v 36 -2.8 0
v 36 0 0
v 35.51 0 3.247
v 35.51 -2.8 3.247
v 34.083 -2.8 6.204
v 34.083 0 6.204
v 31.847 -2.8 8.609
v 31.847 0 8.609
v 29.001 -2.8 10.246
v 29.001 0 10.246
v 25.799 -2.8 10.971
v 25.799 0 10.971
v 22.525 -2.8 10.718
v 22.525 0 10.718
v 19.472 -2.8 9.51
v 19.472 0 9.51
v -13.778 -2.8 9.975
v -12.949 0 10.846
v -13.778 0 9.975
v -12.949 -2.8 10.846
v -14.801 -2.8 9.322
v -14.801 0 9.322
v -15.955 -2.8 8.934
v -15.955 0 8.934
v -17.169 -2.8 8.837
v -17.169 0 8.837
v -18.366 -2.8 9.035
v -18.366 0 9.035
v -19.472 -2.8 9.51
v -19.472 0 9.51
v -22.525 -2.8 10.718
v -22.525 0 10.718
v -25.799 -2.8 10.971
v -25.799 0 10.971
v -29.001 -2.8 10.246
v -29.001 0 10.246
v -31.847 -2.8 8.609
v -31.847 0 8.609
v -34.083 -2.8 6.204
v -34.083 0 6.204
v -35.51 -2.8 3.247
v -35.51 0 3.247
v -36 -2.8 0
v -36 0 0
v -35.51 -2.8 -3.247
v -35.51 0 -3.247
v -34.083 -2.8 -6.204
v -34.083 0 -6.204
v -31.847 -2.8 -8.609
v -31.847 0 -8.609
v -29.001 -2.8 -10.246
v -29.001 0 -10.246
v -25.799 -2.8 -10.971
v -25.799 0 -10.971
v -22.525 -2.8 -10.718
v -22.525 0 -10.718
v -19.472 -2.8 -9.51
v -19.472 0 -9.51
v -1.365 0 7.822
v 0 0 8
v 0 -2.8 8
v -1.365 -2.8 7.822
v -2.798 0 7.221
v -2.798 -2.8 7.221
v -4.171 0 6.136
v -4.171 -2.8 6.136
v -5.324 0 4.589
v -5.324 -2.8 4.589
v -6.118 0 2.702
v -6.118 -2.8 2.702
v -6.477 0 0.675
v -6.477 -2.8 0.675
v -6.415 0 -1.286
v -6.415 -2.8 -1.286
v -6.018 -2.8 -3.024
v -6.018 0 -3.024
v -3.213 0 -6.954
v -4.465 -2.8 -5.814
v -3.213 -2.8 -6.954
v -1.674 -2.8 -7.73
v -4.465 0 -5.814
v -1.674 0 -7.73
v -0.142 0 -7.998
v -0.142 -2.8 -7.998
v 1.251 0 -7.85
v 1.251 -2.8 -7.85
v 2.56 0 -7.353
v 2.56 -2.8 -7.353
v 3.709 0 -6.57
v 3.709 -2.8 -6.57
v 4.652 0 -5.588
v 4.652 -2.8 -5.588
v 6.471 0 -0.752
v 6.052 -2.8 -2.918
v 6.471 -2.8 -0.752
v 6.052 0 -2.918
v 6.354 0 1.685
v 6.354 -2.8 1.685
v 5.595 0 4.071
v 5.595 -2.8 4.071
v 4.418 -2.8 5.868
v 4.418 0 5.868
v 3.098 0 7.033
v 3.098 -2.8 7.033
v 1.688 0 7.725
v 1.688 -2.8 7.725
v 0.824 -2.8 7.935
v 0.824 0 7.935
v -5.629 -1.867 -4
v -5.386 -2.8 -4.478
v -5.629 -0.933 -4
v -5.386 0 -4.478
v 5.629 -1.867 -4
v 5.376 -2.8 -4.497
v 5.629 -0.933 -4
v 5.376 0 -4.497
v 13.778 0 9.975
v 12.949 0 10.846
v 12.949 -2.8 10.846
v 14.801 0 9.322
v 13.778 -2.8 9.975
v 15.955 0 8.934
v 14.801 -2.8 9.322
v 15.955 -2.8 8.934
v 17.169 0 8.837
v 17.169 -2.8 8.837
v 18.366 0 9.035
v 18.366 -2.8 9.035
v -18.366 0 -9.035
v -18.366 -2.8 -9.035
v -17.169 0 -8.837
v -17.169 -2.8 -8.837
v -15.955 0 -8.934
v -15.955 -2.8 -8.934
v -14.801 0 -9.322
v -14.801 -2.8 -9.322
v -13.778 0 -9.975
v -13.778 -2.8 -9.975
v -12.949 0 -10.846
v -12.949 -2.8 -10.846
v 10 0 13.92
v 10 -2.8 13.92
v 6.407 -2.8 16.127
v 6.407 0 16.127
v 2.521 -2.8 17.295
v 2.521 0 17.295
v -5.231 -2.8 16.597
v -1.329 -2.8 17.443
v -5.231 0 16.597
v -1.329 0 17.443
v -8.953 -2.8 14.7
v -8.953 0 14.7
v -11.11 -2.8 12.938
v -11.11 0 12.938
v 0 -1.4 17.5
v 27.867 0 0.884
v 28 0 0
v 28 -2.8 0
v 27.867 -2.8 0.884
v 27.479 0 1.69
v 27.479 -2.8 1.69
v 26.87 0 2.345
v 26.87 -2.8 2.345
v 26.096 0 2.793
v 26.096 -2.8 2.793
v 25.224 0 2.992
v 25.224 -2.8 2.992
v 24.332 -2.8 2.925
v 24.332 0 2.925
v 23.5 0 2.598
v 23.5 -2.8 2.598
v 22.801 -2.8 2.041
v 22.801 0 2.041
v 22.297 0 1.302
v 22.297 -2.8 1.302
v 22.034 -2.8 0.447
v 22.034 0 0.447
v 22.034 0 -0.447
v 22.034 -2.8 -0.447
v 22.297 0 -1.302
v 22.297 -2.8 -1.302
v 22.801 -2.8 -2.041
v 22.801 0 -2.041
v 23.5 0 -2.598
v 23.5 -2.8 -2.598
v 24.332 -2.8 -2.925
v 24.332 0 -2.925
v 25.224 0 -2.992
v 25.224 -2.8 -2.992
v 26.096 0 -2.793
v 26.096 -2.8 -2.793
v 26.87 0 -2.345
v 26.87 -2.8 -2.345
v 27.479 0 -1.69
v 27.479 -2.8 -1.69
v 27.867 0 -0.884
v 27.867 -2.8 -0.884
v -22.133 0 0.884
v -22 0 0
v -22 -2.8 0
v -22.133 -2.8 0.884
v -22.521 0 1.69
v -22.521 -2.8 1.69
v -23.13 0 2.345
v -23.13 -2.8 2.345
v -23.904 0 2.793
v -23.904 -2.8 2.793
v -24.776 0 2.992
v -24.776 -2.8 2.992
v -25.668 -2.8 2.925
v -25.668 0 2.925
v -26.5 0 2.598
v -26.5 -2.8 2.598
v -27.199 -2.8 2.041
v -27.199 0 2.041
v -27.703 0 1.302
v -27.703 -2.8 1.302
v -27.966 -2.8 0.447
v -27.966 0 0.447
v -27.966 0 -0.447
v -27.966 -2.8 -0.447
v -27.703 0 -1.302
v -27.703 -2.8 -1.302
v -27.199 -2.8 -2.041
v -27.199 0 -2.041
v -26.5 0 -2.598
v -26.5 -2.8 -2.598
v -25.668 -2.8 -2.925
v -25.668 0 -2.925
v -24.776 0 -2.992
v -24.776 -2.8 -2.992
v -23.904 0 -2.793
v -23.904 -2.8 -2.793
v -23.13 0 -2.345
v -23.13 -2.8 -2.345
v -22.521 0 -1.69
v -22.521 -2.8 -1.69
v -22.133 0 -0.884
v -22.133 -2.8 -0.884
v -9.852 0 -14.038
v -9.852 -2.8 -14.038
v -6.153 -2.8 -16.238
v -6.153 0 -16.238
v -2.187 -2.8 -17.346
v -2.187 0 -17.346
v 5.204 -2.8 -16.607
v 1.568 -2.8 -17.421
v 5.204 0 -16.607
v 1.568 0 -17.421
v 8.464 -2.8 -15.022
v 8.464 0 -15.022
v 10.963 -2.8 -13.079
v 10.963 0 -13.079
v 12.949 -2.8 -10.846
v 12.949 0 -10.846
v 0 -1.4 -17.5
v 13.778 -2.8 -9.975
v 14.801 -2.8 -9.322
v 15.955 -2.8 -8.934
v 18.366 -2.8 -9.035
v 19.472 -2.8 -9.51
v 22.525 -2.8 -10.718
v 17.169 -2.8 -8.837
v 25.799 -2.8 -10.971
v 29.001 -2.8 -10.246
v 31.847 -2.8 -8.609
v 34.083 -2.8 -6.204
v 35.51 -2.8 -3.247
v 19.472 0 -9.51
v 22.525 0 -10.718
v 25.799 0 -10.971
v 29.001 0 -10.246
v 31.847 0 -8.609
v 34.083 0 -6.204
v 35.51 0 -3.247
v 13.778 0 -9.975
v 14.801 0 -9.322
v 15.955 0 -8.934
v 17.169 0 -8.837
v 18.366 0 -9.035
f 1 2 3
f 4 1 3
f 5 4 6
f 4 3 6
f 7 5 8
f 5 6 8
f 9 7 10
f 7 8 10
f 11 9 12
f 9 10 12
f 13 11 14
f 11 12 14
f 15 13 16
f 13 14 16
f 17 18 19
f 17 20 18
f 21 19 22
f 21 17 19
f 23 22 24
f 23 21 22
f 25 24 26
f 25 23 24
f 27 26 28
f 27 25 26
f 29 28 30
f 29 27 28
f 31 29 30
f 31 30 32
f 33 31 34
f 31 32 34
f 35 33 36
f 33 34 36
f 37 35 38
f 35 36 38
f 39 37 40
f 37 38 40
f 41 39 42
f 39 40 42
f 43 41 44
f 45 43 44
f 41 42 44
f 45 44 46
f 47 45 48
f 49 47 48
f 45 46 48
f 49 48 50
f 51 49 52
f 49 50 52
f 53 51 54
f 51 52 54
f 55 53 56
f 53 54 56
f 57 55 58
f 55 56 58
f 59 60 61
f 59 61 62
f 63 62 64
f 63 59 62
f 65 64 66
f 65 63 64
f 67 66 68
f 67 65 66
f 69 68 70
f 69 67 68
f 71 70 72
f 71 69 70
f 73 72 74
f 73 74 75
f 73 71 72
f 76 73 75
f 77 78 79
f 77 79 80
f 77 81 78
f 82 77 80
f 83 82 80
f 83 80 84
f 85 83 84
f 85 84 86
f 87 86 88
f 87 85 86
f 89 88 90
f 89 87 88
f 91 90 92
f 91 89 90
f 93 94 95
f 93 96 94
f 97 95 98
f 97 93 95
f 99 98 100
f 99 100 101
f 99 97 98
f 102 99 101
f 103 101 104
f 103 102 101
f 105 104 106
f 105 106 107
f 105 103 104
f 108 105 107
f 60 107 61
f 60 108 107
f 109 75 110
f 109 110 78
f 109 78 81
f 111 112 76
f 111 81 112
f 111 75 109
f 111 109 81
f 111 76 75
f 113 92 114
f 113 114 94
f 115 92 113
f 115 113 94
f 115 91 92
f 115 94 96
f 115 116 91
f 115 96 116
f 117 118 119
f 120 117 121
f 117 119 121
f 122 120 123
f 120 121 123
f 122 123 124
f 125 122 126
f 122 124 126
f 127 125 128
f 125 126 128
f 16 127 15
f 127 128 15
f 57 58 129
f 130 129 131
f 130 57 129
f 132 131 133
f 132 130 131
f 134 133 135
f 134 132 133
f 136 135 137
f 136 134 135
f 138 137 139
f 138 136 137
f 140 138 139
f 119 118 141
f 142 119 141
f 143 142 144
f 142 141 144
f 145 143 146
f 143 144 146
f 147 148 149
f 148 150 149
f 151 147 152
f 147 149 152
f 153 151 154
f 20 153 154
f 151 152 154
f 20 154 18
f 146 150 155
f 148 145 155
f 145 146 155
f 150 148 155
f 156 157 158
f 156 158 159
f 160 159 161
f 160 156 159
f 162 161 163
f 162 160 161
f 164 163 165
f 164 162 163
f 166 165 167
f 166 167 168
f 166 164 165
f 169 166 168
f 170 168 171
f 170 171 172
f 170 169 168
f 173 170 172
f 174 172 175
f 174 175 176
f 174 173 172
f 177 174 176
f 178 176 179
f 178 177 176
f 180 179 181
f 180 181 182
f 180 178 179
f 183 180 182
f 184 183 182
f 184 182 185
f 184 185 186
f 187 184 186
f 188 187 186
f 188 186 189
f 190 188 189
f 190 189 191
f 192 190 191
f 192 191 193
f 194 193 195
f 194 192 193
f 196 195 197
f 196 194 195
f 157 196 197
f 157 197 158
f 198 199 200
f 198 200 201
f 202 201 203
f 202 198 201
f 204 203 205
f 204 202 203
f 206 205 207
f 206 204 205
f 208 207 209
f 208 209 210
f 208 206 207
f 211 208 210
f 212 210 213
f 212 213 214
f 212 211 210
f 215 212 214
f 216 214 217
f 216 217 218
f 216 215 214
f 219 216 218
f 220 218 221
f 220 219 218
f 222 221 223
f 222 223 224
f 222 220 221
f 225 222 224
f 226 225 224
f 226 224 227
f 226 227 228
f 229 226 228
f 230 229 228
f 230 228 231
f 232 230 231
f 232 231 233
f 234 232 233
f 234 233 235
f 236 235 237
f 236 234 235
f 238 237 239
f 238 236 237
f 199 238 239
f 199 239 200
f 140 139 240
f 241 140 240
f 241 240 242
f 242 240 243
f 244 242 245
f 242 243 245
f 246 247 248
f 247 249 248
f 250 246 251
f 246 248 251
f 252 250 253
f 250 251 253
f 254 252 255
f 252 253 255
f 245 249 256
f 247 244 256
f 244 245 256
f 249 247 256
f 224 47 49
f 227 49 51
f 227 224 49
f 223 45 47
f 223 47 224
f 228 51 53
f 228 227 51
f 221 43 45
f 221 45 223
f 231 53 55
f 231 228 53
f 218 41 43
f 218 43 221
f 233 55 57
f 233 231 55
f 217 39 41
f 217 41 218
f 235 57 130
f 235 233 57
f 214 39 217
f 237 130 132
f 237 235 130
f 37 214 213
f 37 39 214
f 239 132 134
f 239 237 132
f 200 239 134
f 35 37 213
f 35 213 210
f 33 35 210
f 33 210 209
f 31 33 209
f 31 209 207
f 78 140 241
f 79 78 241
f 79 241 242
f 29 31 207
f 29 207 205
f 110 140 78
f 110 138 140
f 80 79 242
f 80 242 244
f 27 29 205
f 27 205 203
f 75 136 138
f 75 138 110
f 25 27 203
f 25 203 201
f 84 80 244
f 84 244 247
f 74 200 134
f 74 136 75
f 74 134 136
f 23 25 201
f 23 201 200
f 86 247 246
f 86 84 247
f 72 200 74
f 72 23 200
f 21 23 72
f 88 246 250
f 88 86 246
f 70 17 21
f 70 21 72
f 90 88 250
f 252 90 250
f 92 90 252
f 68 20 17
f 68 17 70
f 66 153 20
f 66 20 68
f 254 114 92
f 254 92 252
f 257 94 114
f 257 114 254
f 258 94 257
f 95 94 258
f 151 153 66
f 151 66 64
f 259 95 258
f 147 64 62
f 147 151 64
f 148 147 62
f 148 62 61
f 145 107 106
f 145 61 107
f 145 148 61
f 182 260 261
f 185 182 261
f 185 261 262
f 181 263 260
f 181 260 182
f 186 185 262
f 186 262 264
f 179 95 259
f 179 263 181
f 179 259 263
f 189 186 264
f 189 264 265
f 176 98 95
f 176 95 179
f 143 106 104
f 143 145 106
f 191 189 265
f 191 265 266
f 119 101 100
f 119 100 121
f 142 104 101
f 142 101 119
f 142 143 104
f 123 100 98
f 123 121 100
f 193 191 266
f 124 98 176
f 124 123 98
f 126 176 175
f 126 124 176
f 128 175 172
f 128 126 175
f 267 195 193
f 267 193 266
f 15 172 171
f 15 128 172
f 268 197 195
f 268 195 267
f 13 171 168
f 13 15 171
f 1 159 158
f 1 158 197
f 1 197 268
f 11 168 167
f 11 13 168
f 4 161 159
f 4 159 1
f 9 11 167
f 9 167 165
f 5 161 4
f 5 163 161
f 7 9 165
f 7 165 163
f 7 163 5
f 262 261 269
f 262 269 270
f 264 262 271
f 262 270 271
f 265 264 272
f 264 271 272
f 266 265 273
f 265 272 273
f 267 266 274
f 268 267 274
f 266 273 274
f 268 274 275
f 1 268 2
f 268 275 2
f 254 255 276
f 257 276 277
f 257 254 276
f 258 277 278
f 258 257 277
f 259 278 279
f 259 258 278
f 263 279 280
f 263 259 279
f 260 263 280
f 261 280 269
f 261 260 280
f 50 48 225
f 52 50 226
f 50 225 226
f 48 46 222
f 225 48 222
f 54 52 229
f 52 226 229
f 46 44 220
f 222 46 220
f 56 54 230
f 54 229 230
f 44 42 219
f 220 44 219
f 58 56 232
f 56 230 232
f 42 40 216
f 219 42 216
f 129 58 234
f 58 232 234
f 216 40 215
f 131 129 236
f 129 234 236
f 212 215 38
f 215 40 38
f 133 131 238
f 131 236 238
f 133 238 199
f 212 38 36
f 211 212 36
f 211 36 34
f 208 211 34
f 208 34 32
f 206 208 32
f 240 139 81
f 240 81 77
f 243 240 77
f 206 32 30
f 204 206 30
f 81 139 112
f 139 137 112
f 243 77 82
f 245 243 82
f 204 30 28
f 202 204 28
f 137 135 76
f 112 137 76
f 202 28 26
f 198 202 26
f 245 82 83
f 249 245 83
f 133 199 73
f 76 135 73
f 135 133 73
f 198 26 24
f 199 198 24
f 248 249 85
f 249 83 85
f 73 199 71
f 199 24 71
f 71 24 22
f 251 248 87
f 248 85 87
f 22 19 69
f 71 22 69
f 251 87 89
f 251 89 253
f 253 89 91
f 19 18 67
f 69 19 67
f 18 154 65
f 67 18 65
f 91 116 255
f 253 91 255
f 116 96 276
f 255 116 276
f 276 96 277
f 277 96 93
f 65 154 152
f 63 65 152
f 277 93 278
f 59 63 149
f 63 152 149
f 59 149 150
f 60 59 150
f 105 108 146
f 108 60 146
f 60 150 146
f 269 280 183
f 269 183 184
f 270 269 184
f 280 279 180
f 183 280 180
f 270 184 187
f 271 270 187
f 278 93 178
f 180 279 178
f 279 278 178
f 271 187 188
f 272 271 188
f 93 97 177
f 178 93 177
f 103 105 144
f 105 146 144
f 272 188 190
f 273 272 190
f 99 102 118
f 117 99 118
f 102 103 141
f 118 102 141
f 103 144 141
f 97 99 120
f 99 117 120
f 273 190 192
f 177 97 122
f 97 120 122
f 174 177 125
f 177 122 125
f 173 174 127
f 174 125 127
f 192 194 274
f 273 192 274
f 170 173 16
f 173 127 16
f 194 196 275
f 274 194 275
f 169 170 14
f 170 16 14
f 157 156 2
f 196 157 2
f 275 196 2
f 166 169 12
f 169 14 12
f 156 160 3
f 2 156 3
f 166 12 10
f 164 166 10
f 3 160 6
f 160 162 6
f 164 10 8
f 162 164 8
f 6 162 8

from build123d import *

# Parameters (mm, degrees)
F0_R     = 3
F1_DEPTH = 2.8
F2_R     = 5


with BuildPart() as f1:
    # F0 (on Front) → F1 (new body)
    with BuildSketch(Plane.XZ):
        with BuildLine():
            add(Edge.make_bspline(
                [(15.5973640738, 5.7088035208), (11.7607902987, 17.5), (0, 17.5)],
                knots=[5.0446882158, 5.0446882158, 5.0446882158, 6.2831853072, 6.2831853072, 6.2831853072], degree=2, weights=[1, 0.8143148482, 1]))
            add(Edge.make_bspline(
                [(0, 17.5), (-11.7607902987, 17.5), (-15.5973640738, 5.7088035208)],
                knots=[0, 0, 0, 1.2384970913, 1.2384970913, 1.2384970913], degree=2, weights=[1, 0.8143148482, 1]))
            ThreePointArc((-15.5973640738, 5.7088035208), (-14.4068655444, 2.9640348186), (-14, 0))
            ThreePointArc((-14, 0), (-14.4068655444, -2.9640348186), (-15.5973640738, -5.7088035208))
            add(Edge.make_bspline(
                [(-15.5973640738, -5.7088035208), (0, -53.6452163549), (15.5973640738, -5.7088035208)],
                knots=[1.9030955622, 1.9030955622, 1.9030955622, 4.3800897449, 4.3800897449, 4.3800897449], degree=2, weights=[1, 0.326217344, 1]))
            ThreePointArc((15.5973640738, -5.7088035208), (14, 0), (15.5973640738, 5.7088035208))
        make_face()
        with BuildLine():
            add(Edge.make_bspline(
                [(0, 8), (-11.2583302492, 8), (-5.6291651246, -4), (0, -16), (5.6291651246, -4), (11.2583302492, 8), (0, 8)],
                knots=[0, 0, 0, 2.0943951024, 2.0943951024, 4.1887902048, 4.1887902048, 6.2831853072, 6.2831853072, 6.2831853072], degree=2, weights=[1, 0.5, 1, 0.5, 1, 0.5, 1]))
        make_face(mode=Mode.SUBTRACT)
        with BuildLine():
            ThreePointArc((-14, 0), (-14.4068655444, 2.9640348186), (-15.5973640738, 5.7088035208))
            add(Edge.make_bspline(
                [(-15.5973640738, 5.7088035208), (-17.4548724203, 0), (-15.5973640738, -5.7088035208)],
                knots=[1.2384970913, 1.2384970913, 1.2384970913, 1.9030955622, 1.9030955622, 1.9030955622], degree=2, weights=[1, 0.9452947924, 1]))
            ThreePointArc((-15.5973640738, -5.7088035208), (-14.4068655444, -2.9640348186), (-14, 0))
        make_face()
        with BuildLine():
            add(Edge.make_bspline(
                [(-15.5973640738, 5.7088035208), (-17.4548724203, 0), (-15.5973640738, -5.7088035208)],
                knots=[1.2384970913, 1.2384970913, 1.2384970913, 1.9030955622, 1.9030955622, 1.9030955622], degree=2, weights=[1, 0.9452947924, 1]))
            ThreePointArc((-15.5973640738, 5.7088035208), (-36, 0), (-15.5973640738, -5.7088035208))
        make_face()
        with Locations((-25, 0)):
            Circle(F0_R, mode=Mode.SUBTRACT)
        with BuildLine():
            ThreePointArc((36, 0), (27.9640348186, 10.5931344556), (15.5973640738, 5.7088035208))
            add(Edge.make_bspline(
                [(15.5973640738, -5.7088035208), (17.4548724203, 0), (15.5973640738, 5.7088035208)],
                knots=[4.3800897449, 4.3800897449, 4.3800897449, 5.0446882158, 5.0446882158, 5.0446882158], degree=2, weights=[1, 0.9452947924, 1]))
            ThreePointArc((15.5973640738, -5.7088035208), (27.9640348186, -10.5931344556), (36, 0))
        make_face()
        with Locations((25, 0)):
            Circle(F0_R, mode=Mode.SUBTRACT)
        with BuildLine():
            add(Edge.make_bspline(
                [(15.5973640738, -5.7088035208), (17.4548724203, 0), (15.5973640738, 5.7088035208)],
                knots=[4.3800897449, 4.3800897449, 4.3800897449, 5.0446882158, 5.0446882158, 5.0446882158], degree=2, weights=[1, 0.9452947924, 1]))
            ThreePointArc((15.5973640738, 5.7088035208), (14, 0), (15.5973640738, -5.7088035208))
        make_face()
    extrude(amount=F1_DEPTH)

    # F2
    f2_edges = [f1.edges().sort_by_distance(p)[0] for p in [
        (-15.597364, -1.4, 5.708804),
        (15.597364, -1.4, -5.708804),
        (15.597364, -1.4, 5.708804),
        (-15.597364, -1.4, -5.708804),
    ]]
    fillet(f2_edges, radius=F2_R)


solid = f1.part
